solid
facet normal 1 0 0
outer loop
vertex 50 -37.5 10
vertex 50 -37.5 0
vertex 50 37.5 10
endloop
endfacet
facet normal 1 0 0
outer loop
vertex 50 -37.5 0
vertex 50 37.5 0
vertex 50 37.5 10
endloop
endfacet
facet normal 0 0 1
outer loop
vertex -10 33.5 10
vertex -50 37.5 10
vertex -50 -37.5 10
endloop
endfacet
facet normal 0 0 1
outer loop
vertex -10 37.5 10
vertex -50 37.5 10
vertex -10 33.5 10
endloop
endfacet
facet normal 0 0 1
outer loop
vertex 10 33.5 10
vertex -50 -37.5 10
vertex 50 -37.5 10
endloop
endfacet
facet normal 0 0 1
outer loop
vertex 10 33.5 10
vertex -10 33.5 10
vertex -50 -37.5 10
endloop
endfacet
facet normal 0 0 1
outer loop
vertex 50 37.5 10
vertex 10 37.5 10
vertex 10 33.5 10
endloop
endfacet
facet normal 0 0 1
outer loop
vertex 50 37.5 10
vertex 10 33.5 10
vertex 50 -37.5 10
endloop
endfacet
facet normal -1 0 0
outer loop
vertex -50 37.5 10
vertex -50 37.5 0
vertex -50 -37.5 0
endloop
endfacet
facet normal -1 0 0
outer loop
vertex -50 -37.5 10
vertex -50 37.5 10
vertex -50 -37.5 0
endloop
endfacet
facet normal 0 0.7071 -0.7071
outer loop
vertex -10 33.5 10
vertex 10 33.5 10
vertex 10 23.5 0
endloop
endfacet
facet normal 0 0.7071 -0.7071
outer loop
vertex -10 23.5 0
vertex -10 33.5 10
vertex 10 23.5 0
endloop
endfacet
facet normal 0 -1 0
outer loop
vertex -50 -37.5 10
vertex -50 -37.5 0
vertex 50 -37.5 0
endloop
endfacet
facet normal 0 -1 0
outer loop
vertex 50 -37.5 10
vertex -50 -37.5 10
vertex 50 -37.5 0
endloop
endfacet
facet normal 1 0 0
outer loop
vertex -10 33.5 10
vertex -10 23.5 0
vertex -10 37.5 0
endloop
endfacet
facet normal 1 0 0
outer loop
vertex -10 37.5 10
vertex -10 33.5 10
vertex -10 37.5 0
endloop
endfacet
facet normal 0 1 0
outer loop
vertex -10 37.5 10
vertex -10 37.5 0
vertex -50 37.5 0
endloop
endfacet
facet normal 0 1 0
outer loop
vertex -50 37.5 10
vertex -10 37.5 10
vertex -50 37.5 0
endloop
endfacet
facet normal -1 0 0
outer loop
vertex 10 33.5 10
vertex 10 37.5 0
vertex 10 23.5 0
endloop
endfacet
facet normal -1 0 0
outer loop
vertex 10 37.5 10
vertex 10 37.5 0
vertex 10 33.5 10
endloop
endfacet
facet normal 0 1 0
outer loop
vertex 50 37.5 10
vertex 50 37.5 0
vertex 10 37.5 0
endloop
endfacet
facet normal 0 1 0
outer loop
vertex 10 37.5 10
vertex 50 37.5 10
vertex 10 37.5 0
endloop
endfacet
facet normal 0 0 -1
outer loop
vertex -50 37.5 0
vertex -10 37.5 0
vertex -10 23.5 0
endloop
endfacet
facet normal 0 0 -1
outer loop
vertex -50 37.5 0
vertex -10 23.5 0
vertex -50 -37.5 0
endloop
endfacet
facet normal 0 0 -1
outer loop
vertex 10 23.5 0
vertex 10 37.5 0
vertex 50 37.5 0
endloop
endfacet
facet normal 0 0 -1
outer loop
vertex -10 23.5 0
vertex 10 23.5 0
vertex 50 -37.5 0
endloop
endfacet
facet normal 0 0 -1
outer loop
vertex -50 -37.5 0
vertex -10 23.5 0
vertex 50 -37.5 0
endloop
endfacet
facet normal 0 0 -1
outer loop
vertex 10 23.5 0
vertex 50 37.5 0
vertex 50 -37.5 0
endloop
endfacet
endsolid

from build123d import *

# Parameters (mm, degrees)
BOSS_EXTRU_1_DEPTH      = 10
ENL_V_MAT_EXTRU_4_DEPTH = 60
BOSS_EXTRU_2_DEPTH      = 40


with BuildPart() as part:
    # Esquisse1 → Boss.-Extru.1 (new body)
    with BuildSketch(Plane.XY):
        Polygon((-50, -37.5), (50, -37.5), (50, 37.5), (10, 37.5), (10, 33.5), (-10, 33.5), (-10, 37.5), (-50, 37.5), align=None)
    extrude(amount=BOSS_EXTRU_1_DEPTH)

    # Esquisse4 → Enlèv. mat.-Extru.4 (cut)
    with BuildSketch(Plane(origin=(50, 0, 0), x_dir=(0, 0, -1), z_dir=(1, 0, 0))):
        Polygon((-10, 33.5), (0, 23.5), (0, 33.5), align=None)
    extrude(amount=-ENL_V_MAT_EXTRU_4_DEPTH, mode=Mode.SUBTRACT)


with BuildPart() as enl_v_mat_extru_4_piece_1:
    # of the separate pieces the step leaves, piece 1, a body of its own (enl_v_mat_extru_4_pieces)
    add(part.part.solids().sort_by_distance((-50, -37.5, 0))[0])



with BuildPart() as enl_v_mat_extru_4_piece_2:
    # of the separate pieces the step leaves, piece 2, a body of its own (enl_v_mat_extru_4_pieces)
    add(part.part.solids().sort_by_distance((10, 37.5, 10))[0])


with BuildPart() as enl_v_mat_extru_4_piece_1_1:
    add(enl_v_mat_extru_4_piece_1.part)

    add(enl_v_mat_extru_4_piece_2.part)  # Boss.-Extru.2 merges Enlèv. mat.-Extru.4 piece 2
    # Esquisse11 → Boss.-Extru.2 (add)
    with BuildSketch(Plane(origin=(50, 0, 0), x_dir=(0, 0, -1), z_dir=(1, 0, 0))):
        Polygon((-10, 33.5), (0, 33.5), (0, 23.5), align=None)
    extrude(amount=-BOSS_EXTRU_2_DEPTH)


solid = enl_v_mat_extru_4_piece_1_1.part
